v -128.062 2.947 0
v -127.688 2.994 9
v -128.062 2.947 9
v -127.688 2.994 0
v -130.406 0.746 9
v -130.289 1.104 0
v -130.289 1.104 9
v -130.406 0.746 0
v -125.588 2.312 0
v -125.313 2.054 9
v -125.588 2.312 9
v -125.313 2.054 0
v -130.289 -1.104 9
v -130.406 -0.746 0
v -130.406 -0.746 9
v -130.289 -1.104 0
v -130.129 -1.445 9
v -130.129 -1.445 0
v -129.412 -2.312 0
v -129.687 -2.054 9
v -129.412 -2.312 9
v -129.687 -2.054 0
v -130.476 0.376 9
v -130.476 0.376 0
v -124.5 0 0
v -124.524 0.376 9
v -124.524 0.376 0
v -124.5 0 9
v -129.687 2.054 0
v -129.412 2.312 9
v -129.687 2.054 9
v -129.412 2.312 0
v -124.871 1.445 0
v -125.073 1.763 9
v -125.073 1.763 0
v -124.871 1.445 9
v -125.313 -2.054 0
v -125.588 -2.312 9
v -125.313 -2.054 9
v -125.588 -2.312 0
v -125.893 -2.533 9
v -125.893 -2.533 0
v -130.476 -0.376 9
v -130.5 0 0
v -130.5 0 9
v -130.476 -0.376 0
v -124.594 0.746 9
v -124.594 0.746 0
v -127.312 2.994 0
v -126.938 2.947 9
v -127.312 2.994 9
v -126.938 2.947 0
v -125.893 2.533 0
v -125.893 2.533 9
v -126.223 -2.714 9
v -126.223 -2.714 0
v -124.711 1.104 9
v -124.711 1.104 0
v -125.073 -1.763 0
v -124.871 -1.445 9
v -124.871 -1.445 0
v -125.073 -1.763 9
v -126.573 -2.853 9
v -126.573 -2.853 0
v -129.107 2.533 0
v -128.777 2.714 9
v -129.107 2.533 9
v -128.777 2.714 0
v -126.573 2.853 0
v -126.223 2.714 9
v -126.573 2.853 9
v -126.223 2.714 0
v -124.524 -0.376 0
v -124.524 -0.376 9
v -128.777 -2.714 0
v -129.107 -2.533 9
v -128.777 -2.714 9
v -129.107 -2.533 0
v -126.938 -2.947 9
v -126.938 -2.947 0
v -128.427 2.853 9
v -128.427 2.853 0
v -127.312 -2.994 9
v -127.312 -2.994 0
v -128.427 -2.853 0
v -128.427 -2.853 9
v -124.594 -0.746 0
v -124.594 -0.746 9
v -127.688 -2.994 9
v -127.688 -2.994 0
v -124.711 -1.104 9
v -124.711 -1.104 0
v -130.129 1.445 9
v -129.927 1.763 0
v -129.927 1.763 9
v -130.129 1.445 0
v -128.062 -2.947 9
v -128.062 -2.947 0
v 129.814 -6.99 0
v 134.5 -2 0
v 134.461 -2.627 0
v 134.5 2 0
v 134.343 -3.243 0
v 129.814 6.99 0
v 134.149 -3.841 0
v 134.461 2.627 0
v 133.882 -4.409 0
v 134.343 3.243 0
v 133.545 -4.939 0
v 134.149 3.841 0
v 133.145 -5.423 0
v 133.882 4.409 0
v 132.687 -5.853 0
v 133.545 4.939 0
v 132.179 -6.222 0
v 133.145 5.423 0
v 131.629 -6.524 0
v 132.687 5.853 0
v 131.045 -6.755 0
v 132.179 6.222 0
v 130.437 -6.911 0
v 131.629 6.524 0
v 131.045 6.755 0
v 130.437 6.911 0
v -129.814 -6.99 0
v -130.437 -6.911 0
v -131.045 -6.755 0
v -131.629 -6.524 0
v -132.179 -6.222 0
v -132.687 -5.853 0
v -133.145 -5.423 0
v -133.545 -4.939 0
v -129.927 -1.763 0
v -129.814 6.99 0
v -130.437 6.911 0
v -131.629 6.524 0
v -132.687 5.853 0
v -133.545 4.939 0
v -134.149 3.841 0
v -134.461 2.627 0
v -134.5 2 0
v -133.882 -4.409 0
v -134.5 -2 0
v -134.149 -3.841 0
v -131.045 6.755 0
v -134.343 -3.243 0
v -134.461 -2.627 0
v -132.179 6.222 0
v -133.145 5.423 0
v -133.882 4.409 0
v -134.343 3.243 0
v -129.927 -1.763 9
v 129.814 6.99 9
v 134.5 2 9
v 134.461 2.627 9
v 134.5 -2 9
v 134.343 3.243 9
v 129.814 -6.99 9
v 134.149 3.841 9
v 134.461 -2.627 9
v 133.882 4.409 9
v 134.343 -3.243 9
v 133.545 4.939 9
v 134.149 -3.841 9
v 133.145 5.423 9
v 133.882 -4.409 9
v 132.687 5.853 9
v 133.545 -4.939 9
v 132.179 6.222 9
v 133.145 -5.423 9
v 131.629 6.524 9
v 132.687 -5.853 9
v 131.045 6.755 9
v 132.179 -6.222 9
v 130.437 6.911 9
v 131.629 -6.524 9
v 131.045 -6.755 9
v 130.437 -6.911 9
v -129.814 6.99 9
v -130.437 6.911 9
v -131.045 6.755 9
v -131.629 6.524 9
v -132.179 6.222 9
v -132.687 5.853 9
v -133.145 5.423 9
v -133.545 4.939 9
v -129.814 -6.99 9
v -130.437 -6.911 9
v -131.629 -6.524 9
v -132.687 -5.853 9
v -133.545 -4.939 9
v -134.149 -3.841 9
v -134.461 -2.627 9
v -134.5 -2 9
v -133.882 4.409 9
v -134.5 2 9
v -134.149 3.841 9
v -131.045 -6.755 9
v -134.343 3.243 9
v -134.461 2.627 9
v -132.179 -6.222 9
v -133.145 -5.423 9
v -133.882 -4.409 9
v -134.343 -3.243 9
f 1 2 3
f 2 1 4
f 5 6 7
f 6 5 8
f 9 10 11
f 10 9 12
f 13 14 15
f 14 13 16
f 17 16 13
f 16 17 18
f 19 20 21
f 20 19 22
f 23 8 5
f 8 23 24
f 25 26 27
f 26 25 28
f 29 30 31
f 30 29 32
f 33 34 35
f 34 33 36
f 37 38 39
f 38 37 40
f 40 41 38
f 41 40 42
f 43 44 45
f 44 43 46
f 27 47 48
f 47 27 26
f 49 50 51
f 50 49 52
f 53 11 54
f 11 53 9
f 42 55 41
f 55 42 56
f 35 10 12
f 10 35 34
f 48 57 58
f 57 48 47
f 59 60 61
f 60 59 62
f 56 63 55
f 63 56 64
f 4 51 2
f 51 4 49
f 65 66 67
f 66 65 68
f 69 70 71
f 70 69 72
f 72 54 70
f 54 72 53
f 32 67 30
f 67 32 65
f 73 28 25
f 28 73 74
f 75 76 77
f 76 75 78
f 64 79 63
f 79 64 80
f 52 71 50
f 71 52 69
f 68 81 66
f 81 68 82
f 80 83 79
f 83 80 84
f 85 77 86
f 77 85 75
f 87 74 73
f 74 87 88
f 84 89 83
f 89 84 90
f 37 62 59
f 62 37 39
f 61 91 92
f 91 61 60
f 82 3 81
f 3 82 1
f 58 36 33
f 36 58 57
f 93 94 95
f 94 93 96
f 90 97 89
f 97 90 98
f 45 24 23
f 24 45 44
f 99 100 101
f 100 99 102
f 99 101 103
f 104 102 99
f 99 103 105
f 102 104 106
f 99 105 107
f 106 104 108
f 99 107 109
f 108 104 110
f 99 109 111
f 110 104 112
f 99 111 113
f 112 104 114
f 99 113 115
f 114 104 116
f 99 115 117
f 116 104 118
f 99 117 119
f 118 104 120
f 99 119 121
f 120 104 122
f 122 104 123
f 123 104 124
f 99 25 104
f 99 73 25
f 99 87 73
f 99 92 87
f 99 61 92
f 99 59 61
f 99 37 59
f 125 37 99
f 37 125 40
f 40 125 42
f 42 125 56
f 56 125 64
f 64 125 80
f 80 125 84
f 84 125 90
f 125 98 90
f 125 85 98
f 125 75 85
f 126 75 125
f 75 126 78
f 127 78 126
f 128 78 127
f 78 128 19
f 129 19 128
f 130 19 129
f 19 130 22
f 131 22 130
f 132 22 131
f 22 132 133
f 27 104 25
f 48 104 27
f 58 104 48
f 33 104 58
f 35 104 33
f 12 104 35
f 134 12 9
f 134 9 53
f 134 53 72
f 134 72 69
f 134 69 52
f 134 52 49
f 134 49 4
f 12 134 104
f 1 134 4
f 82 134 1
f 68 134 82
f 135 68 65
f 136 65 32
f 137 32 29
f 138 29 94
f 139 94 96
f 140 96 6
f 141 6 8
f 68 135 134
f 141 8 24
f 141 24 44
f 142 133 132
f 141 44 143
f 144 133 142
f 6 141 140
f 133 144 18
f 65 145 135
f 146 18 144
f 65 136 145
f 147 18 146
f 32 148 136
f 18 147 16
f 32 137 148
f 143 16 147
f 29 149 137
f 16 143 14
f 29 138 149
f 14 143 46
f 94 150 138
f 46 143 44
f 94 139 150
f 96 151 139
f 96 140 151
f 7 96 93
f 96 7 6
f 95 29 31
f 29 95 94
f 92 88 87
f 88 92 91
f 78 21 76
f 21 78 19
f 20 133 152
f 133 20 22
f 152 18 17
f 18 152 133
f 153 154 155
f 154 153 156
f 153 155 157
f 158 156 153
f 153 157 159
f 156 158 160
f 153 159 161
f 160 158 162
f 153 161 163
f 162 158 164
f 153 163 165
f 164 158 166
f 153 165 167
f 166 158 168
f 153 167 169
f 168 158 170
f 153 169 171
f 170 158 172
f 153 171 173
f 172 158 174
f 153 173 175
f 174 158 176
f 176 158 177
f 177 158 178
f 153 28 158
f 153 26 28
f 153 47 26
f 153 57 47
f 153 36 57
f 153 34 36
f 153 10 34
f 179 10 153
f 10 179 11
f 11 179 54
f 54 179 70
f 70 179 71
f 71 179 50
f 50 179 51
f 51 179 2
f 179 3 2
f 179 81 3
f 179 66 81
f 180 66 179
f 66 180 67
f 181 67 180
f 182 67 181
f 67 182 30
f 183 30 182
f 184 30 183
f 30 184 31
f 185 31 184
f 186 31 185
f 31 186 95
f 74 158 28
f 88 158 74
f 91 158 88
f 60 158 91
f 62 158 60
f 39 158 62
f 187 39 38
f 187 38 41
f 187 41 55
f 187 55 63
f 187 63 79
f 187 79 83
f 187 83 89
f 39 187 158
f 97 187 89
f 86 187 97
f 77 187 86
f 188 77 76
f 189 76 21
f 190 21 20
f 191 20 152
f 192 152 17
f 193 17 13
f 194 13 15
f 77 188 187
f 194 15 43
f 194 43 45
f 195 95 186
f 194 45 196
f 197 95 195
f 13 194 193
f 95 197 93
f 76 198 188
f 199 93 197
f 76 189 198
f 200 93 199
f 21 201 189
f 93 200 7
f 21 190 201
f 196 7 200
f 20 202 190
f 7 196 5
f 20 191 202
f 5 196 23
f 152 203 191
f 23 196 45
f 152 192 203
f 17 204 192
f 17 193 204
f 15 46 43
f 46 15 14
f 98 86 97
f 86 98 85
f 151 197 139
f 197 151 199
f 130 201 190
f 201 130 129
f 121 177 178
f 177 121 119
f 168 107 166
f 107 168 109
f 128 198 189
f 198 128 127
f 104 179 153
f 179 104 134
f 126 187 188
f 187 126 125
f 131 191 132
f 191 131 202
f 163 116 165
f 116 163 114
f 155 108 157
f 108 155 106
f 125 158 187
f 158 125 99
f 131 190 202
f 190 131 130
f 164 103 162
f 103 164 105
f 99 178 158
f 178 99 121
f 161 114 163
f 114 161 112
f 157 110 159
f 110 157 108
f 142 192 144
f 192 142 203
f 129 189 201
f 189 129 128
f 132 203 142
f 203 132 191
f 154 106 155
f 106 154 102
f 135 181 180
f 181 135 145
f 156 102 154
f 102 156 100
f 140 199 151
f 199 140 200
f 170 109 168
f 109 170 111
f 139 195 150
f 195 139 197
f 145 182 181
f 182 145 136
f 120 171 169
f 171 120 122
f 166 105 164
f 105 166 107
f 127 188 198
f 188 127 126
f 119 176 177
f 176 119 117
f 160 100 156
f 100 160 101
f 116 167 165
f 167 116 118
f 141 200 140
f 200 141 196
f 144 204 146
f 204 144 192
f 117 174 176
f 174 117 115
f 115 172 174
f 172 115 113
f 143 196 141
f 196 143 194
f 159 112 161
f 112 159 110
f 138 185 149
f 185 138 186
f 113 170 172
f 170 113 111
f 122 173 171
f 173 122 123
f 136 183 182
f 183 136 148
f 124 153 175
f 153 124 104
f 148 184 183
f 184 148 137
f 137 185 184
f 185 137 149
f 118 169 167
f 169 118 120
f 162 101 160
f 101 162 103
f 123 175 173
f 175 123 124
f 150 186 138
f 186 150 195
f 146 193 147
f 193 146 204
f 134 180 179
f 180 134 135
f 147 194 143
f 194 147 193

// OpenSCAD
$fn = 50;


difference() {
	union() {
		hull() {
			translate(v = [-129.5000000000, 2.0000000000, 0]) {
				cylinder(h = 9, r = 5);
			}
			translate(v = [129.5000000000, 2.0000000000, 0]) {
				cylinder(h = 9, r = 5);
			}
			translate(v = [-129.5000000000, -2.0000000000, 0]) {
				cylinder(h = 9, r = 5);
			}
			translate(v = [129.5000000000, -2.0000000000, 0]) {
				cylinder(h = 9, r = 5);
			}
		}
	}
	union() {
		translate(v = [-127.5000000000, 0.0000000000, 0]) {
			cylinder(h = 9, r = 3.0000000000);
		}
		translate(v = [-127.5000000000, 0.0000000000, 0]) {
			cylinder(h = 9, r = 1.5000000000);
		}
		translate(v = [-127.5000000000, 0.0000000000, 0]) {
			cylinder(h = 9, r = 1.5000000000);
		}
		translate(v = [-127.5000000000, 0.0000000000, 0]) {
			cylinder(h = 9, r = 1.5000000000);
		}
	}
}
